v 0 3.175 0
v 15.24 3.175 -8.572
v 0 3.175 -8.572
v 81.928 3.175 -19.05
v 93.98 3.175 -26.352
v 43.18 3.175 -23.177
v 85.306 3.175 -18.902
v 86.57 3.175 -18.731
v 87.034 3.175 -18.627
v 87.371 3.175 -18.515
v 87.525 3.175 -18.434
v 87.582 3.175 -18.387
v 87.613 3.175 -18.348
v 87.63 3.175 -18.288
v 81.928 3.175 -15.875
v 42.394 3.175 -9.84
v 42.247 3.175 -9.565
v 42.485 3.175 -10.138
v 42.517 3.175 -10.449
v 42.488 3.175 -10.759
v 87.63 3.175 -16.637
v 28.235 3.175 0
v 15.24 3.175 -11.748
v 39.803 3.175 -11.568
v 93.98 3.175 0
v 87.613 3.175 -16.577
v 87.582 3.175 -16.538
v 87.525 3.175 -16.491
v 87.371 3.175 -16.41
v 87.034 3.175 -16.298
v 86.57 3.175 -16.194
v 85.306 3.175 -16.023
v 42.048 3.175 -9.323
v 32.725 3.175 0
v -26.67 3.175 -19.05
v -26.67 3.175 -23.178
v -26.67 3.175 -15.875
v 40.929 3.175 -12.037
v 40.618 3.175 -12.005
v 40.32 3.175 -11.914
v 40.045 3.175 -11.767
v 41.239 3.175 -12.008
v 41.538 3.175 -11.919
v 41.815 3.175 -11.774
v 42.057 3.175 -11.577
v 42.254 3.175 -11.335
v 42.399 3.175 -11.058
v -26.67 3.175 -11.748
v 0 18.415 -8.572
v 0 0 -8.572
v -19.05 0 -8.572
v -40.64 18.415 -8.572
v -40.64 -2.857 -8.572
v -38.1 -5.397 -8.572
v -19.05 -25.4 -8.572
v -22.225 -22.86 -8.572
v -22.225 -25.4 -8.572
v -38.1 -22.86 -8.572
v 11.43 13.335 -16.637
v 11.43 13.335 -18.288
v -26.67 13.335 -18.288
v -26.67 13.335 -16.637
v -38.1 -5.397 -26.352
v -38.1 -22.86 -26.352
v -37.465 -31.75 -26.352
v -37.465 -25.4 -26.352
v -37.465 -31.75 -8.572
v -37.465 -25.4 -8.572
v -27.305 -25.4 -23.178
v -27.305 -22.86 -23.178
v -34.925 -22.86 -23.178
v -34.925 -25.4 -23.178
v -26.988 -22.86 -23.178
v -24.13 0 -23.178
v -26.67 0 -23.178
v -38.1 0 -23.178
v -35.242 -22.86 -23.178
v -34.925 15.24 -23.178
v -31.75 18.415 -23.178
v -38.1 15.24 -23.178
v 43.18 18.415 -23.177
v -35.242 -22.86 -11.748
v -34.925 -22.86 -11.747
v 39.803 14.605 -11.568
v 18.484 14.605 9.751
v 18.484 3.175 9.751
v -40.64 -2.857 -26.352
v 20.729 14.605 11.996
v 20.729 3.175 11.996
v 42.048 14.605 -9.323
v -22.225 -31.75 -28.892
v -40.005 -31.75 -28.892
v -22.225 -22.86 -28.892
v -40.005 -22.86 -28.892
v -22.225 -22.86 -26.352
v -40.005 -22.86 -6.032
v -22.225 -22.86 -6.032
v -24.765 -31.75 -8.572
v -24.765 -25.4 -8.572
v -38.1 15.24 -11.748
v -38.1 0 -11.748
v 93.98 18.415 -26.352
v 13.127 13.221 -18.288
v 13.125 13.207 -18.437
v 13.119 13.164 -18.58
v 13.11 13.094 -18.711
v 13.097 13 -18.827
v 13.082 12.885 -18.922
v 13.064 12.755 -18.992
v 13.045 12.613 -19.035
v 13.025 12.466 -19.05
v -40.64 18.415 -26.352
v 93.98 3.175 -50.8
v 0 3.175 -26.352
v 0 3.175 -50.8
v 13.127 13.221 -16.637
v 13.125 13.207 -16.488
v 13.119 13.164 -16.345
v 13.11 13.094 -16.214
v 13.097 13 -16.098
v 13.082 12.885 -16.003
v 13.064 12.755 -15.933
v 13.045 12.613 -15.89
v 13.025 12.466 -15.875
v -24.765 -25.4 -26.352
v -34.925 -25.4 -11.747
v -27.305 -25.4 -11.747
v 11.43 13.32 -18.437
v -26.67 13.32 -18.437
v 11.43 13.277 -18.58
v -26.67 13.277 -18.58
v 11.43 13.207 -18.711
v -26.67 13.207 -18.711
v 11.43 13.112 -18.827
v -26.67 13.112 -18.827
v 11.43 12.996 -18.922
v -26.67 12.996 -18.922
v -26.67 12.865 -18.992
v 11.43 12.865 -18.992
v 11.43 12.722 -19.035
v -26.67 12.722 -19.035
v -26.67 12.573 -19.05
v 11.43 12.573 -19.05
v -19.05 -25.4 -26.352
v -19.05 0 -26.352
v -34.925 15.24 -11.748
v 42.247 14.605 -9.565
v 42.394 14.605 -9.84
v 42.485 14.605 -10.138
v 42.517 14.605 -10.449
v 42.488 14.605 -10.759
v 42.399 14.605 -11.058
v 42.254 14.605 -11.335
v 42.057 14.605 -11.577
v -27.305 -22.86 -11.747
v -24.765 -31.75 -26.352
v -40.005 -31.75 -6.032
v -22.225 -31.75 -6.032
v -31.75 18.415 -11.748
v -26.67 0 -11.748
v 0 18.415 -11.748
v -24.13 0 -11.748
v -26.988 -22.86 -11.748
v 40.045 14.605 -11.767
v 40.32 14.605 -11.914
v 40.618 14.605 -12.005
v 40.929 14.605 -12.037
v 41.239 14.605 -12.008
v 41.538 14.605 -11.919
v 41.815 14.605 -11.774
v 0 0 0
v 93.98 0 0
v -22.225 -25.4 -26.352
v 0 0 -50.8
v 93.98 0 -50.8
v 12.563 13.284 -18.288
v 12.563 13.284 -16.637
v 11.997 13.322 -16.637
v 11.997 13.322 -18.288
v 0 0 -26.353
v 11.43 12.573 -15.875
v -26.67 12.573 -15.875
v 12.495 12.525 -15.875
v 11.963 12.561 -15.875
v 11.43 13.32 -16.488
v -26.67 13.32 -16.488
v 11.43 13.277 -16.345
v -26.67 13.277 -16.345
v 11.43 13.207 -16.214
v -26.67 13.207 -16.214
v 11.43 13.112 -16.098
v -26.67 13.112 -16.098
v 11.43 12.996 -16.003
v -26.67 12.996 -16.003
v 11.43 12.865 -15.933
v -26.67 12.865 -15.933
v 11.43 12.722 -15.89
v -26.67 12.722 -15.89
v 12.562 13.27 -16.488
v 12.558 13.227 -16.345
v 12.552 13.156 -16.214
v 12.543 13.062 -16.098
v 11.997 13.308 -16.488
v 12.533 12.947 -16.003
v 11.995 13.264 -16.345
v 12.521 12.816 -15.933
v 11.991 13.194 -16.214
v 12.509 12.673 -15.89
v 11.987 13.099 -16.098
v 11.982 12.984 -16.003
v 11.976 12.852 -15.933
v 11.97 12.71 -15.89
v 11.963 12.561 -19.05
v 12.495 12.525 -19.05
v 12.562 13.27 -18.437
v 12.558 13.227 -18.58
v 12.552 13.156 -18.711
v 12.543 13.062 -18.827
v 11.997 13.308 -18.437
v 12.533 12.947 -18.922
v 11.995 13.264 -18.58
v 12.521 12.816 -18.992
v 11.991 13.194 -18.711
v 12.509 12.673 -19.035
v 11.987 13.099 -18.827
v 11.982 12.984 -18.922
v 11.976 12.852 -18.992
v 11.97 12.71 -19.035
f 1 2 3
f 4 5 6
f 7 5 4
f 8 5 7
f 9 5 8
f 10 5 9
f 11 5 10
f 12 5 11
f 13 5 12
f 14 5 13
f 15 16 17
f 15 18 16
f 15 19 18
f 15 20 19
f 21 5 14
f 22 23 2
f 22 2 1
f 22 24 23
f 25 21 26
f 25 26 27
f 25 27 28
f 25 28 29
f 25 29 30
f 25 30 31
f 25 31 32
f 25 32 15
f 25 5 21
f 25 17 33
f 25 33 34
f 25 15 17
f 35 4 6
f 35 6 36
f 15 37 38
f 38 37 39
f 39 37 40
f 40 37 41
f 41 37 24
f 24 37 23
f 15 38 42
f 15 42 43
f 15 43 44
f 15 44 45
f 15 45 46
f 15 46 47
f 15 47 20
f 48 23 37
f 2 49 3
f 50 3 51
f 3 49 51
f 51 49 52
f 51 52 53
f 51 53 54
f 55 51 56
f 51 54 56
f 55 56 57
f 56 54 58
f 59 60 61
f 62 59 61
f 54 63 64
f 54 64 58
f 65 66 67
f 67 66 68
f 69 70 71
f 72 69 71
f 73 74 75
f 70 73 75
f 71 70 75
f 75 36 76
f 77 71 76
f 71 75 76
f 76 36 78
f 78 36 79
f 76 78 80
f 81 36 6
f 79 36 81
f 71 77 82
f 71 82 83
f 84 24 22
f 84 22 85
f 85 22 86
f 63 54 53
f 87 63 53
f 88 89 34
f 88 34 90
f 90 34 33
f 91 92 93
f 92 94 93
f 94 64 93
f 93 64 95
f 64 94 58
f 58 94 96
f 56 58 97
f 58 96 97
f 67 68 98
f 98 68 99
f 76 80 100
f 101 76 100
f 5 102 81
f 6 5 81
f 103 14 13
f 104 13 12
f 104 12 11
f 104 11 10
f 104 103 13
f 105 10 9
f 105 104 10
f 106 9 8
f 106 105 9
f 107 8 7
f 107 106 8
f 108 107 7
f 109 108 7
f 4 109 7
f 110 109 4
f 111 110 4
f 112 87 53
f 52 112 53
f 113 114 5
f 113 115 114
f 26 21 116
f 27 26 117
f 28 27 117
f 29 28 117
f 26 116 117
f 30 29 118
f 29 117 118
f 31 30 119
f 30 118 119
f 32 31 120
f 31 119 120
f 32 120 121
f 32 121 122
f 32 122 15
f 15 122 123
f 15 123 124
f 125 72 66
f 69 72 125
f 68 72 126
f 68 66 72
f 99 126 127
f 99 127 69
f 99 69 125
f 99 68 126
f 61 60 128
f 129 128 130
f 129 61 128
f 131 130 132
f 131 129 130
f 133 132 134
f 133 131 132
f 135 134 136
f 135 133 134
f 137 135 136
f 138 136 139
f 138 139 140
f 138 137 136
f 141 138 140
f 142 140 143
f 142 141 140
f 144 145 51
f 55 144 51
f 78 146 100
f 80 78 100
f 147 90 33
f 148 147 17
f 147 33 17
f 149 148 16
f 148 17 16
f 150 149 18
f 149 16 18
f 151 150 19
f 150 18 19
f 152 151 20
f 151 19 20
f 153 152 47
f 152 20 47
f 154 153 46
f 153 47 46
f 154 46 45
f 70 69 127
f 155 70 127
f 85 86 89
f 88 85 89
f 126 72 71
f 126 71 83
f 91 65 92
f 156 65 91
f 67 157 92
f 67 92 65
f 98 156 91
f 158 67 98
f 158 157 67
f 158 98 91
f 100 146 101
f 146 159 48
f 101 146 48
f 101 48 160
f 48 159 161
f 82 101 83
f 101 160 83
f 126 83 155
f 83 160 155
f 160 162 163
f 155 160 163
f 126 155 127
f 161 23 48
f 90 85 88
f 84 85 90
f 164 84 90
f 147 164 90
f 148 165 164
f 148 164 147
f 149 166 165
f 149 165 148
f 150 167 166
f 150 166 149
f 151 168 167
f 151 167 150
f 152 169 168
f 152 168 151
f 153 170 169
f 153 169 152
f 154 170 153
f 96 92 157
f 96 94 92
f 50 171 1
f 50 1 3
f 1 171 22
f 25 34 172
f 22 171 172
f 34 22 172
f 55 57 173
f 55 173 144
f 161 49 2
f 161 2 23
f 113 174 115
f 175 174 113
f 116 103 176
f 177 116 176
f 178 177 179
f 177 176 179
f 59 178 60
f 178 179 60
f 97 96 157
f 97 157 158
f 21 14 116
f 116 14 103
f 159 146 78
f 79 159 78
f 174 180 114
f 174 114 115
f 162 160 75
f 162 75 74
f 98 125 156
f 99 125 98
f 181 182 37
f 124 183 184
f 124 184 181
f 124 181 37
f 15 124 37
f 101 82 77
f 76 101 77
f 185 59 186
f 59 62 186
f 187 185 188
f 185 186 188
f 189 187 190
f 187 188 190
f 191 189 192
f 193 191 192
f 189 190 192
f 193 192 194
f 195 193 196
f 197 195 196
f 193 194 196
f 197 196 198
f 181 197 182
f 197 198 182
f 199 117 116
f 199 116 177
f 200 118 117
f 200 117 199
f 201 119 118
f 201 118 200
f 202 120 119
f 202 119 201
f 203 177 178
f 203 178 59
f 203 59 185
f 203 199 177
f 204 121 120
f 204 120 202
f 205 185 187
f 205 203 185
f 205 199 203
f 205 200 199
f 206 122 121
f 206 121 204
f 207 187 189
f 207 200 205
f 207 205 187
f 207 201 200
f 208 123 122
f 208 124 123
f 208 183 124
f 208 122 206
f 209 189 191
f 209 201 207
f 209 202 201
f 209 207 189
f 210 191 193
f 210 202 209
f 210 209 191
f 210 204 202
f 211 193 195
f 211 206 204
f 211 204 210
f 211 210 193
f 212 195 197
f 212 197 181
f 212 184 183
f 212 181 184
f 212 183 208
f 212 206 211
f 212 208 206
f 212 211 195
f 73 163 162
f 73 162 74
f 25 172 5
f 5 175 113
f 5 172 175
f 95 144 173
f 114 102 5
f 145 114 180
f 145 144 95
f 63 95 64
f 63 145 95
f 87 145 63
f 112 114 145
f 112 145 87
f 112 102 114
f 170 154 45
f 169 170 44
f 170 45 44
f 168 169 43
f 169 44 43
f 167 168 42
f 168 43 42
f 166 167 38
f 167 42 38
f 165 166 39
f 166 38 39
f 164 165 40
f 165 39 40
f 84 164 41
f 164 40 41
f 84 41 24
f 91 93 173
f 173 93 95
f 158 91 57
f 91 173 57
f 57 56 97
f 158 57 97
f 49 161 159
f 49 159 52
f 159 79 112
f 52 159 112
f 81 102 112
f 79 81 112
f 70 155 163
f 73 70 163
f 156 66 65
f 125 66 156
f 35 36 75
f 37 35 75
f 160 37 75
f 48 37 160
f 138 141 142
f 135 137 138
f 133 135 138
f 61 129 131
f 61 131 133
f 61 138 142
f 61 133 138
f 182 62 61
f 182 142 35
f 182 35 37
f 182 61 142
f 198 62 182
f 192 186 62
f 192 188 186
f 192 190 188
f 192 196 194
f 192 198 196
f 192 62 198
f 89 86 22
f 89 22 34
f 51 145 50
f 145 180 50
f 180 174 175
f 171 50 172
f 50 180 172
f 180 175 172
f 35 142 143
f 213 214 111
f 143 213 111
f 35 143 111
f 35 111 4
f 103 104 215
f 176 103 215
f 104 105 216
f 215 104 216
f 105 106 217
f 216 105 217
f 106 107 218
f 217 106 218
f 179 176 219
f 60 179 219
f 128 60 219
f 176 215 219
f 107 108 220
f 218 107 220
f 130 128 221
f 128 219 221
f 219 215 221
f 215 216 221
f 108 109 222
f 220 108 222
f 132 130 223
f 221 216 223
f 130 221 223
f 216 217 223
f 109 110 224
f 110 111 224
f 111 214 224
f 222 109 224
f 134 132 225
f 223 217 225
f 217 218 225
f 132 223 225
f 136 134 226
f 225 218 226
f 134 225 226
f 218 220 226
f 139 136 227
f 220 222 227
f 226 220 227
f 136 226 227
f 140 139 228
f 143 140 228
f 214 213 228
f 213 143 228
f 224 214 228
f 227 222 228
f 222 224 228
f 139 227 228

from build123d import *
from OCP.BRepFilletAPI import BRepFilletAPI_MakeChamfer

# Parameters (mm, degrees)
SKETCH1_W            = 93.98
SKETCH1_H            = 50.8
BOSS_EXTRUDE1_DEPTH  = 3.175
BOSS_EXTRUDE2_DEPTH  = 3.175
FILLET1_R            = 0.762
BOSS_EXTRUDE3_DEPTH  = 11.43
FILLET2_R            = 1.6002
SKETCH4_W            = 3.175
SKETCH4_H            = 15.24
SKETCH4_H_2          = 3.175
BOSS_EXTRUDE4_DEPTH  = 38.1
CHAMFER1_SIZE        = 15.24
SKETCH8_W            = 19.05
SKETCH8_H            = 17.78
BOSS_EXTRUDE5_DEPTH  = 25.4
SKETCH9_W            = 7.62
SKETCH9_H            = 11.43
CUT_EXTRUDE3_DEPTH   = 110.809108912
CHAMFER2_SIZE        = 3.175
CHAMFER2_SIZE_2      = 25.4
SKETCH14_W           = 17.78
SKETCH14_H           = 22.86
SKETCH14_W_2         = 7.62
SKETCH14_H_2         = 11.43
BOSS_EXTRUDE11_DEPTH = 2.54
SKETCH10_W           = 17.78
SKETCH10_H           = 22.86
SKETCH10_W_2         = 12.7
SKETCH10_H_2         = 17.78
BOSS_EXTRUDE12_DEPTH = 6.35
SKETCH11_W           = 6.35
SKETCH11_H           = 3.175
BOSS_EXTRUDE7_DEPTH  = 14.605
CHAMFER3_SIZE        = 3.175
SKETCH13_W           = 17.78
SKETCH13_H           = 20.6375
BOSS_EXTRUDE8_DEPTH  = 2.54
CHAMFER4_SIZE        = 3.175
SKETCH15_W           = 93.98
SKETCH15_H           = 15.24
BOSS_EXTRUDE13_DEPTH = 3.175
CHAMFER5_SIZE        = 3.175
CHAMFER5_SIZE_2      = 50.8
SKETCH17_W           = 26.67
SKETCH17_H           = 14.605
BOSS_EXTRUDE14_DEPTH = 3.175


# Some blends are built 0.0001 mm under size
with BuildPart() as part:
    # Sketch1 → Boss-Extrude1 (new body)
    with BuildSketch(Plane(origin=(0, 0, 0), x_dir=(1, 0, 0), z_dir=(0, 1, 0))):
        with Locations((46.99, 25.4)):
            Rectangle(SKETCH1_W, SKETCH1_H)
    extrude(amount=BOSS_EXTRUDE1_DEPTH)

    # Sketch2 → Boss-Extrude2 (add)
    with BuildSketch(Plane.XY.offset(-19.05)):
        with BuildLine():
            Line((87.63, 3.175), (13.127130217, 13.221093478))
            ThreePointArc((13.127130217, 13.221093478), (12.280474231, 13.306491372), (11.43, 13.335))
            Line((11.43, 13.335), (-26.67, 13.335))
            Line((-26.67, 13.335), (-26.67, 3.175))
            Line((-26.67, 3.175), (87.63, 3.175))
        make_face()
    extrude(amount=BOSS_EXTRUDE2_DEPTH)

    # Fillet1
    fillet1_edges = [part.edges().sort_by_distance(p)[0] for p in [
        (50.378565109, 8.198046739, -19.05),
        (12.280474231, 13.306491372, -19.05),
        (-7.62, 13.335, -19.05),
        (50.378565109, 8.198046739, -15.875),
        (12.280474231, 13.306491372, -15.875),
        (-7.62, 13.335, -15.875),
    ]]
    fillet(fillet1_edges, radius=FILLET1_R)

    # Sketch3 → Boss-Extrude3 (add)
    with BuildSketch(Plane(origin=(0, 3.175, 0), x_dir=(1, 0, 0), z_dir=(0, 1, 0))):
        Polygon((43.18, 10.45493597), (40.93493597, 12.7), (18.484295667, -9.750640303), (20.729359697, -11.995704333), align=None)
    extrude(amount=BOSS_EXTRUDE3_DEPTH)

    # Fillet2
    # the kernel refuses this fillet: 1.6002 mm, written as the material it takes off along each edge
    with BuildSketch(Plane(origin=(40.93493597, 3.175, -12.7), x_dir=(0.7071067811865515, 0, 0.7071067811865437), z_dir=(0, 1, 0)), Plane(origin=(43.18, 3.175, -10.45493597), x_dir=(-0.7071067811865437, 0, 0.7071067811865515), z_dir=(0, 1, 0))) as fillet2_piece_1:
        with BuildLine():
            CenterArc((FILLET2_R, -FILLET2_R), FILLET2_R, 90, 90)
            Line((0, -FILLET2_R), (0, 0))
            Line((0, 0), (FILLET2_R, 0))
        make_face()
    extrude(amount=15.4305, mode=Mode.SUBTRACT)

    # Sketch4 → Boss-Extrude4 (add)
    with BuildSketch(Plane.ZY):
        with Locations((-24.765, 10.795)):
            Rectangle(SKETCH4_W, SKETCH4_H)
        with Locations((-10.16, 10.795)):
            Rectangle(SKETCH4_W, SKETCH4_H)
        with Locations((-10.16, 1.5875)):
            Rectangle(SKETCH4_W, SKETCH4_H_2)
        with Locations((-24.765, 1.5875)):
            Rectangle(SKETCH4_W, SKETCH4_H_2)
    extrude(amount=BOSS_EXTRUDE4_DEPTH)

    # Chamfer1
    chamfer1_edges = [part.edges().sort_by_distance(p)[0] for p in [
        (0, 3.175, -10.16),
        (0, 3.175, -24.765),
    ]]
    chamfer(chamfer1_edges, length=CHAMFER1_SIZE - 0.0001)  # a hair under: the kernel refuses the full size

    # Sketch8 → Boss-Extrude5 (add)
    with BuildSketch(Plane.XZ):
        with Locations((-28.575, -17.4625)):
            Rectangle(SKETCH8_W, SKETCH8_H)
    extrude(amount=BOSS_EXTRUDE5_DEPTH)

    # Sketch9 → Cut-Extrude3 (cut, through all)
    with BuildSketch(Plane(origin=(0, 0, 0), x_dir=(1, 0, 0), z_dir=(0, 1, 0))):
        with Locations((-31.115, 17.4625)):
            Rectangle(SKETCH9_W, SKETCH9_H)
    extrude(amount=-CUT_EXTRUDE3_DEPTH, mode=Mode.SUBTRACT)

    # Chamfer2
    chamfer2_edges_1 = [part.edges().sort_by_distance(p)[0] for p in [
        (-27.305, 0, -17.4625),
    ]]
    chamfer2_side_1 = [part.faces().sort_by_distance(p)[0] for p in [
        (-27.2415, 0, -17.4625),
    ]]
    chamfer2_edges_2 = [part.edges().sort_by_distance(p)[0] for p in [
        (-34.925, 0, -17.4625),
    ]]
    chamfer2_side_2 = [part.faces().sort_by_distance(p)[0] for p in [
        (-34.9885, 0, -17.4625),
    ]]
    chamfer2 = BRepFilletAPI_MakeChamfer(part.part.solid().wrapped)
    for e in chamfer2_edges_1:
        chamfer2.Add(CHAMFER2_SIZE - 0.0001, CHAMFER2_SIZE_2 - 0.0001, e.wrapped, chamfer2_side_1[0].wrapped)
    for e in chamfer2_edges_2:
        chamfer2.Add(CHAMFER2_SIZE - 0.0001, CHAMFER2_SIZE_2 - 0.0001, e.wrapped, chamfer2_side_2[0].wrapped)
    add(Compound.cast(chamfer2.Shape()), mode=Mode.REPLACE)  # a hair under: the kernel refuses the full size

    # Sketch14 → Boss-Extrude11 (add)
    with BuildSketch(Plane.XZ.offset(25.4)):
        with Locations((-31.115, -17.4625)):
            Rectangle(SKETCH14_W, SKETCH14_H)
        with Locations((-31.115, -17.4625)):
            Rectangle(SKETCH14_W_2, SKETCH14_H_2, mode=Mode.SUBTRACT)
    extrude(amount=-BOSS_EXTRUDE11_DEPTH)

    # Sketch10 → Boss-Extrude12 (add)
    with BuildSketch(Plane.XZ.offset(25.4)):
        with Locations((-31.115, -17.4625)):
            Rectangle(SKETCH10_W, SKETCH10_H)
        with Locations((-31.115, -17.4625)):
            Rectangle(SKETCH10_W_2, SKETCH10_H_2, mode=Mode.SUBTRACT)
    extrude(amount=BOSS_EXTRUDE12_DEPTH)

    # Sketch11 → Boss-Extrude7 (add)
    with BuildSketch(Plane(origin=(0, 0, -11.7475), x_dir=(-1, 0, 0), z_dir=(0, 0, -1))):
        with Locations((34.925, 16.8275)):
            Rectangle(SKETCH11_W, SKETCH11_H)
    extrude(amount=BOSS_EXTRUDE7_DEPTH)

    # Chamfer3
    chamfer3_edges = [part.edges().sort_by_distance(p)[0] for p in [
        (-31.75, 15.24, -17.4625),
    ]]
    chamfer(chamfer3_edges, length=CHAMFER3_SIZE - 0.0001)  # a hair under: the kernel refuses the full size

    # Sketch13 → Boss-Extrude8 (add)
    with BuildSketch(Plane.ZY.offset(38.1)):
        with Locations((-17.4625, 8.09625)):
            Rectangle(SKETCH13_W, SKETCH13_H)
    extrude(amount=BOSS_EXTRUDE8_DEPTH)

    # Chamfer4
    # the kernel refuses this chamfer: 3.175 mm, written as the material it adds along each edge
    with BuildSketch(Plane(origin=(-38.1, -2.2225, -8.5725), x_dir=(0.02749587661058565, -0.9996219169112968, 0), z_dir=(0, 0, -1))) as chamfer4_piece_1_section:
        Polygon((CHAMFER4_SIZE * 0.999621916911, CHAMFER4_SIZE * 0.0274958766106), (-CHAMFER4_SIZE * 0.0274958766106, CHAMFER4_SIZE * 0.999621916911), (0, 0), align=None)
    chamfer4_piece_1 = extrude(amount=17.78, mode=Mode.PRIVATE)
    chamfer4_piece_1 = split(chamfer4_piece_1, bisect_by=Plane(origin=(-40.64, -3.320155959, -17.4625), z_dir=(1, 0, 0)), keep=Keep.TOP, mode=Mode.PRIVATE)
    add(chamfer4_piece_1)

    # Sketch15 → Boss-Extrude13 (add)
    with BuildSketch(Plane(origin=(0, 0, -26.3525), x_dir=(-1, 0, 0), z_dir=(0, 0, -1))):
        with Locations((-46.99, 10.795)):
            Rectangle(SKETCH15_W, SKETCH15_H)
    extrude(amount=-BOSS_EXTRUDE13_DEPTH)

    # Chamfer5
    # the kernel refuses this chamfer: 50.8, 3.175 mm, written as the material it takes off along each edge
    with BuildSketch(Plane(origin=(93.98, 150.485487252, -23.1775), x_dir=(0.5233850041899423, 0, -0.8520963193143684), z_dir=(0, -1, 0))) as chamfer5_piece_1:
        Polygon((CHAMFER5_SIZE * 0.852096319314, -CHAMFER5_SIZE * 0.52338500419), (-CHAMFER5_SIZE_2 * 0.52338500419, -CHAMFER5_SIZE_2 * 0.852096319314), (0, 0), align=None)
    extrude(amount=147.310487252, mode=Mode.SUBTRACT)

    # Sketch17 → Boss-Extrude14 (add)
    with BuildSketch(Plane.XZ.offset(-3.175)):
        with Locations((-13.335, -19.05)):
            Rectangle(SKETCH17_W, SKETCH17_H)
    extrude(amount=BOSS_EXTRUDE14_DEPTH)


solid = part.part
